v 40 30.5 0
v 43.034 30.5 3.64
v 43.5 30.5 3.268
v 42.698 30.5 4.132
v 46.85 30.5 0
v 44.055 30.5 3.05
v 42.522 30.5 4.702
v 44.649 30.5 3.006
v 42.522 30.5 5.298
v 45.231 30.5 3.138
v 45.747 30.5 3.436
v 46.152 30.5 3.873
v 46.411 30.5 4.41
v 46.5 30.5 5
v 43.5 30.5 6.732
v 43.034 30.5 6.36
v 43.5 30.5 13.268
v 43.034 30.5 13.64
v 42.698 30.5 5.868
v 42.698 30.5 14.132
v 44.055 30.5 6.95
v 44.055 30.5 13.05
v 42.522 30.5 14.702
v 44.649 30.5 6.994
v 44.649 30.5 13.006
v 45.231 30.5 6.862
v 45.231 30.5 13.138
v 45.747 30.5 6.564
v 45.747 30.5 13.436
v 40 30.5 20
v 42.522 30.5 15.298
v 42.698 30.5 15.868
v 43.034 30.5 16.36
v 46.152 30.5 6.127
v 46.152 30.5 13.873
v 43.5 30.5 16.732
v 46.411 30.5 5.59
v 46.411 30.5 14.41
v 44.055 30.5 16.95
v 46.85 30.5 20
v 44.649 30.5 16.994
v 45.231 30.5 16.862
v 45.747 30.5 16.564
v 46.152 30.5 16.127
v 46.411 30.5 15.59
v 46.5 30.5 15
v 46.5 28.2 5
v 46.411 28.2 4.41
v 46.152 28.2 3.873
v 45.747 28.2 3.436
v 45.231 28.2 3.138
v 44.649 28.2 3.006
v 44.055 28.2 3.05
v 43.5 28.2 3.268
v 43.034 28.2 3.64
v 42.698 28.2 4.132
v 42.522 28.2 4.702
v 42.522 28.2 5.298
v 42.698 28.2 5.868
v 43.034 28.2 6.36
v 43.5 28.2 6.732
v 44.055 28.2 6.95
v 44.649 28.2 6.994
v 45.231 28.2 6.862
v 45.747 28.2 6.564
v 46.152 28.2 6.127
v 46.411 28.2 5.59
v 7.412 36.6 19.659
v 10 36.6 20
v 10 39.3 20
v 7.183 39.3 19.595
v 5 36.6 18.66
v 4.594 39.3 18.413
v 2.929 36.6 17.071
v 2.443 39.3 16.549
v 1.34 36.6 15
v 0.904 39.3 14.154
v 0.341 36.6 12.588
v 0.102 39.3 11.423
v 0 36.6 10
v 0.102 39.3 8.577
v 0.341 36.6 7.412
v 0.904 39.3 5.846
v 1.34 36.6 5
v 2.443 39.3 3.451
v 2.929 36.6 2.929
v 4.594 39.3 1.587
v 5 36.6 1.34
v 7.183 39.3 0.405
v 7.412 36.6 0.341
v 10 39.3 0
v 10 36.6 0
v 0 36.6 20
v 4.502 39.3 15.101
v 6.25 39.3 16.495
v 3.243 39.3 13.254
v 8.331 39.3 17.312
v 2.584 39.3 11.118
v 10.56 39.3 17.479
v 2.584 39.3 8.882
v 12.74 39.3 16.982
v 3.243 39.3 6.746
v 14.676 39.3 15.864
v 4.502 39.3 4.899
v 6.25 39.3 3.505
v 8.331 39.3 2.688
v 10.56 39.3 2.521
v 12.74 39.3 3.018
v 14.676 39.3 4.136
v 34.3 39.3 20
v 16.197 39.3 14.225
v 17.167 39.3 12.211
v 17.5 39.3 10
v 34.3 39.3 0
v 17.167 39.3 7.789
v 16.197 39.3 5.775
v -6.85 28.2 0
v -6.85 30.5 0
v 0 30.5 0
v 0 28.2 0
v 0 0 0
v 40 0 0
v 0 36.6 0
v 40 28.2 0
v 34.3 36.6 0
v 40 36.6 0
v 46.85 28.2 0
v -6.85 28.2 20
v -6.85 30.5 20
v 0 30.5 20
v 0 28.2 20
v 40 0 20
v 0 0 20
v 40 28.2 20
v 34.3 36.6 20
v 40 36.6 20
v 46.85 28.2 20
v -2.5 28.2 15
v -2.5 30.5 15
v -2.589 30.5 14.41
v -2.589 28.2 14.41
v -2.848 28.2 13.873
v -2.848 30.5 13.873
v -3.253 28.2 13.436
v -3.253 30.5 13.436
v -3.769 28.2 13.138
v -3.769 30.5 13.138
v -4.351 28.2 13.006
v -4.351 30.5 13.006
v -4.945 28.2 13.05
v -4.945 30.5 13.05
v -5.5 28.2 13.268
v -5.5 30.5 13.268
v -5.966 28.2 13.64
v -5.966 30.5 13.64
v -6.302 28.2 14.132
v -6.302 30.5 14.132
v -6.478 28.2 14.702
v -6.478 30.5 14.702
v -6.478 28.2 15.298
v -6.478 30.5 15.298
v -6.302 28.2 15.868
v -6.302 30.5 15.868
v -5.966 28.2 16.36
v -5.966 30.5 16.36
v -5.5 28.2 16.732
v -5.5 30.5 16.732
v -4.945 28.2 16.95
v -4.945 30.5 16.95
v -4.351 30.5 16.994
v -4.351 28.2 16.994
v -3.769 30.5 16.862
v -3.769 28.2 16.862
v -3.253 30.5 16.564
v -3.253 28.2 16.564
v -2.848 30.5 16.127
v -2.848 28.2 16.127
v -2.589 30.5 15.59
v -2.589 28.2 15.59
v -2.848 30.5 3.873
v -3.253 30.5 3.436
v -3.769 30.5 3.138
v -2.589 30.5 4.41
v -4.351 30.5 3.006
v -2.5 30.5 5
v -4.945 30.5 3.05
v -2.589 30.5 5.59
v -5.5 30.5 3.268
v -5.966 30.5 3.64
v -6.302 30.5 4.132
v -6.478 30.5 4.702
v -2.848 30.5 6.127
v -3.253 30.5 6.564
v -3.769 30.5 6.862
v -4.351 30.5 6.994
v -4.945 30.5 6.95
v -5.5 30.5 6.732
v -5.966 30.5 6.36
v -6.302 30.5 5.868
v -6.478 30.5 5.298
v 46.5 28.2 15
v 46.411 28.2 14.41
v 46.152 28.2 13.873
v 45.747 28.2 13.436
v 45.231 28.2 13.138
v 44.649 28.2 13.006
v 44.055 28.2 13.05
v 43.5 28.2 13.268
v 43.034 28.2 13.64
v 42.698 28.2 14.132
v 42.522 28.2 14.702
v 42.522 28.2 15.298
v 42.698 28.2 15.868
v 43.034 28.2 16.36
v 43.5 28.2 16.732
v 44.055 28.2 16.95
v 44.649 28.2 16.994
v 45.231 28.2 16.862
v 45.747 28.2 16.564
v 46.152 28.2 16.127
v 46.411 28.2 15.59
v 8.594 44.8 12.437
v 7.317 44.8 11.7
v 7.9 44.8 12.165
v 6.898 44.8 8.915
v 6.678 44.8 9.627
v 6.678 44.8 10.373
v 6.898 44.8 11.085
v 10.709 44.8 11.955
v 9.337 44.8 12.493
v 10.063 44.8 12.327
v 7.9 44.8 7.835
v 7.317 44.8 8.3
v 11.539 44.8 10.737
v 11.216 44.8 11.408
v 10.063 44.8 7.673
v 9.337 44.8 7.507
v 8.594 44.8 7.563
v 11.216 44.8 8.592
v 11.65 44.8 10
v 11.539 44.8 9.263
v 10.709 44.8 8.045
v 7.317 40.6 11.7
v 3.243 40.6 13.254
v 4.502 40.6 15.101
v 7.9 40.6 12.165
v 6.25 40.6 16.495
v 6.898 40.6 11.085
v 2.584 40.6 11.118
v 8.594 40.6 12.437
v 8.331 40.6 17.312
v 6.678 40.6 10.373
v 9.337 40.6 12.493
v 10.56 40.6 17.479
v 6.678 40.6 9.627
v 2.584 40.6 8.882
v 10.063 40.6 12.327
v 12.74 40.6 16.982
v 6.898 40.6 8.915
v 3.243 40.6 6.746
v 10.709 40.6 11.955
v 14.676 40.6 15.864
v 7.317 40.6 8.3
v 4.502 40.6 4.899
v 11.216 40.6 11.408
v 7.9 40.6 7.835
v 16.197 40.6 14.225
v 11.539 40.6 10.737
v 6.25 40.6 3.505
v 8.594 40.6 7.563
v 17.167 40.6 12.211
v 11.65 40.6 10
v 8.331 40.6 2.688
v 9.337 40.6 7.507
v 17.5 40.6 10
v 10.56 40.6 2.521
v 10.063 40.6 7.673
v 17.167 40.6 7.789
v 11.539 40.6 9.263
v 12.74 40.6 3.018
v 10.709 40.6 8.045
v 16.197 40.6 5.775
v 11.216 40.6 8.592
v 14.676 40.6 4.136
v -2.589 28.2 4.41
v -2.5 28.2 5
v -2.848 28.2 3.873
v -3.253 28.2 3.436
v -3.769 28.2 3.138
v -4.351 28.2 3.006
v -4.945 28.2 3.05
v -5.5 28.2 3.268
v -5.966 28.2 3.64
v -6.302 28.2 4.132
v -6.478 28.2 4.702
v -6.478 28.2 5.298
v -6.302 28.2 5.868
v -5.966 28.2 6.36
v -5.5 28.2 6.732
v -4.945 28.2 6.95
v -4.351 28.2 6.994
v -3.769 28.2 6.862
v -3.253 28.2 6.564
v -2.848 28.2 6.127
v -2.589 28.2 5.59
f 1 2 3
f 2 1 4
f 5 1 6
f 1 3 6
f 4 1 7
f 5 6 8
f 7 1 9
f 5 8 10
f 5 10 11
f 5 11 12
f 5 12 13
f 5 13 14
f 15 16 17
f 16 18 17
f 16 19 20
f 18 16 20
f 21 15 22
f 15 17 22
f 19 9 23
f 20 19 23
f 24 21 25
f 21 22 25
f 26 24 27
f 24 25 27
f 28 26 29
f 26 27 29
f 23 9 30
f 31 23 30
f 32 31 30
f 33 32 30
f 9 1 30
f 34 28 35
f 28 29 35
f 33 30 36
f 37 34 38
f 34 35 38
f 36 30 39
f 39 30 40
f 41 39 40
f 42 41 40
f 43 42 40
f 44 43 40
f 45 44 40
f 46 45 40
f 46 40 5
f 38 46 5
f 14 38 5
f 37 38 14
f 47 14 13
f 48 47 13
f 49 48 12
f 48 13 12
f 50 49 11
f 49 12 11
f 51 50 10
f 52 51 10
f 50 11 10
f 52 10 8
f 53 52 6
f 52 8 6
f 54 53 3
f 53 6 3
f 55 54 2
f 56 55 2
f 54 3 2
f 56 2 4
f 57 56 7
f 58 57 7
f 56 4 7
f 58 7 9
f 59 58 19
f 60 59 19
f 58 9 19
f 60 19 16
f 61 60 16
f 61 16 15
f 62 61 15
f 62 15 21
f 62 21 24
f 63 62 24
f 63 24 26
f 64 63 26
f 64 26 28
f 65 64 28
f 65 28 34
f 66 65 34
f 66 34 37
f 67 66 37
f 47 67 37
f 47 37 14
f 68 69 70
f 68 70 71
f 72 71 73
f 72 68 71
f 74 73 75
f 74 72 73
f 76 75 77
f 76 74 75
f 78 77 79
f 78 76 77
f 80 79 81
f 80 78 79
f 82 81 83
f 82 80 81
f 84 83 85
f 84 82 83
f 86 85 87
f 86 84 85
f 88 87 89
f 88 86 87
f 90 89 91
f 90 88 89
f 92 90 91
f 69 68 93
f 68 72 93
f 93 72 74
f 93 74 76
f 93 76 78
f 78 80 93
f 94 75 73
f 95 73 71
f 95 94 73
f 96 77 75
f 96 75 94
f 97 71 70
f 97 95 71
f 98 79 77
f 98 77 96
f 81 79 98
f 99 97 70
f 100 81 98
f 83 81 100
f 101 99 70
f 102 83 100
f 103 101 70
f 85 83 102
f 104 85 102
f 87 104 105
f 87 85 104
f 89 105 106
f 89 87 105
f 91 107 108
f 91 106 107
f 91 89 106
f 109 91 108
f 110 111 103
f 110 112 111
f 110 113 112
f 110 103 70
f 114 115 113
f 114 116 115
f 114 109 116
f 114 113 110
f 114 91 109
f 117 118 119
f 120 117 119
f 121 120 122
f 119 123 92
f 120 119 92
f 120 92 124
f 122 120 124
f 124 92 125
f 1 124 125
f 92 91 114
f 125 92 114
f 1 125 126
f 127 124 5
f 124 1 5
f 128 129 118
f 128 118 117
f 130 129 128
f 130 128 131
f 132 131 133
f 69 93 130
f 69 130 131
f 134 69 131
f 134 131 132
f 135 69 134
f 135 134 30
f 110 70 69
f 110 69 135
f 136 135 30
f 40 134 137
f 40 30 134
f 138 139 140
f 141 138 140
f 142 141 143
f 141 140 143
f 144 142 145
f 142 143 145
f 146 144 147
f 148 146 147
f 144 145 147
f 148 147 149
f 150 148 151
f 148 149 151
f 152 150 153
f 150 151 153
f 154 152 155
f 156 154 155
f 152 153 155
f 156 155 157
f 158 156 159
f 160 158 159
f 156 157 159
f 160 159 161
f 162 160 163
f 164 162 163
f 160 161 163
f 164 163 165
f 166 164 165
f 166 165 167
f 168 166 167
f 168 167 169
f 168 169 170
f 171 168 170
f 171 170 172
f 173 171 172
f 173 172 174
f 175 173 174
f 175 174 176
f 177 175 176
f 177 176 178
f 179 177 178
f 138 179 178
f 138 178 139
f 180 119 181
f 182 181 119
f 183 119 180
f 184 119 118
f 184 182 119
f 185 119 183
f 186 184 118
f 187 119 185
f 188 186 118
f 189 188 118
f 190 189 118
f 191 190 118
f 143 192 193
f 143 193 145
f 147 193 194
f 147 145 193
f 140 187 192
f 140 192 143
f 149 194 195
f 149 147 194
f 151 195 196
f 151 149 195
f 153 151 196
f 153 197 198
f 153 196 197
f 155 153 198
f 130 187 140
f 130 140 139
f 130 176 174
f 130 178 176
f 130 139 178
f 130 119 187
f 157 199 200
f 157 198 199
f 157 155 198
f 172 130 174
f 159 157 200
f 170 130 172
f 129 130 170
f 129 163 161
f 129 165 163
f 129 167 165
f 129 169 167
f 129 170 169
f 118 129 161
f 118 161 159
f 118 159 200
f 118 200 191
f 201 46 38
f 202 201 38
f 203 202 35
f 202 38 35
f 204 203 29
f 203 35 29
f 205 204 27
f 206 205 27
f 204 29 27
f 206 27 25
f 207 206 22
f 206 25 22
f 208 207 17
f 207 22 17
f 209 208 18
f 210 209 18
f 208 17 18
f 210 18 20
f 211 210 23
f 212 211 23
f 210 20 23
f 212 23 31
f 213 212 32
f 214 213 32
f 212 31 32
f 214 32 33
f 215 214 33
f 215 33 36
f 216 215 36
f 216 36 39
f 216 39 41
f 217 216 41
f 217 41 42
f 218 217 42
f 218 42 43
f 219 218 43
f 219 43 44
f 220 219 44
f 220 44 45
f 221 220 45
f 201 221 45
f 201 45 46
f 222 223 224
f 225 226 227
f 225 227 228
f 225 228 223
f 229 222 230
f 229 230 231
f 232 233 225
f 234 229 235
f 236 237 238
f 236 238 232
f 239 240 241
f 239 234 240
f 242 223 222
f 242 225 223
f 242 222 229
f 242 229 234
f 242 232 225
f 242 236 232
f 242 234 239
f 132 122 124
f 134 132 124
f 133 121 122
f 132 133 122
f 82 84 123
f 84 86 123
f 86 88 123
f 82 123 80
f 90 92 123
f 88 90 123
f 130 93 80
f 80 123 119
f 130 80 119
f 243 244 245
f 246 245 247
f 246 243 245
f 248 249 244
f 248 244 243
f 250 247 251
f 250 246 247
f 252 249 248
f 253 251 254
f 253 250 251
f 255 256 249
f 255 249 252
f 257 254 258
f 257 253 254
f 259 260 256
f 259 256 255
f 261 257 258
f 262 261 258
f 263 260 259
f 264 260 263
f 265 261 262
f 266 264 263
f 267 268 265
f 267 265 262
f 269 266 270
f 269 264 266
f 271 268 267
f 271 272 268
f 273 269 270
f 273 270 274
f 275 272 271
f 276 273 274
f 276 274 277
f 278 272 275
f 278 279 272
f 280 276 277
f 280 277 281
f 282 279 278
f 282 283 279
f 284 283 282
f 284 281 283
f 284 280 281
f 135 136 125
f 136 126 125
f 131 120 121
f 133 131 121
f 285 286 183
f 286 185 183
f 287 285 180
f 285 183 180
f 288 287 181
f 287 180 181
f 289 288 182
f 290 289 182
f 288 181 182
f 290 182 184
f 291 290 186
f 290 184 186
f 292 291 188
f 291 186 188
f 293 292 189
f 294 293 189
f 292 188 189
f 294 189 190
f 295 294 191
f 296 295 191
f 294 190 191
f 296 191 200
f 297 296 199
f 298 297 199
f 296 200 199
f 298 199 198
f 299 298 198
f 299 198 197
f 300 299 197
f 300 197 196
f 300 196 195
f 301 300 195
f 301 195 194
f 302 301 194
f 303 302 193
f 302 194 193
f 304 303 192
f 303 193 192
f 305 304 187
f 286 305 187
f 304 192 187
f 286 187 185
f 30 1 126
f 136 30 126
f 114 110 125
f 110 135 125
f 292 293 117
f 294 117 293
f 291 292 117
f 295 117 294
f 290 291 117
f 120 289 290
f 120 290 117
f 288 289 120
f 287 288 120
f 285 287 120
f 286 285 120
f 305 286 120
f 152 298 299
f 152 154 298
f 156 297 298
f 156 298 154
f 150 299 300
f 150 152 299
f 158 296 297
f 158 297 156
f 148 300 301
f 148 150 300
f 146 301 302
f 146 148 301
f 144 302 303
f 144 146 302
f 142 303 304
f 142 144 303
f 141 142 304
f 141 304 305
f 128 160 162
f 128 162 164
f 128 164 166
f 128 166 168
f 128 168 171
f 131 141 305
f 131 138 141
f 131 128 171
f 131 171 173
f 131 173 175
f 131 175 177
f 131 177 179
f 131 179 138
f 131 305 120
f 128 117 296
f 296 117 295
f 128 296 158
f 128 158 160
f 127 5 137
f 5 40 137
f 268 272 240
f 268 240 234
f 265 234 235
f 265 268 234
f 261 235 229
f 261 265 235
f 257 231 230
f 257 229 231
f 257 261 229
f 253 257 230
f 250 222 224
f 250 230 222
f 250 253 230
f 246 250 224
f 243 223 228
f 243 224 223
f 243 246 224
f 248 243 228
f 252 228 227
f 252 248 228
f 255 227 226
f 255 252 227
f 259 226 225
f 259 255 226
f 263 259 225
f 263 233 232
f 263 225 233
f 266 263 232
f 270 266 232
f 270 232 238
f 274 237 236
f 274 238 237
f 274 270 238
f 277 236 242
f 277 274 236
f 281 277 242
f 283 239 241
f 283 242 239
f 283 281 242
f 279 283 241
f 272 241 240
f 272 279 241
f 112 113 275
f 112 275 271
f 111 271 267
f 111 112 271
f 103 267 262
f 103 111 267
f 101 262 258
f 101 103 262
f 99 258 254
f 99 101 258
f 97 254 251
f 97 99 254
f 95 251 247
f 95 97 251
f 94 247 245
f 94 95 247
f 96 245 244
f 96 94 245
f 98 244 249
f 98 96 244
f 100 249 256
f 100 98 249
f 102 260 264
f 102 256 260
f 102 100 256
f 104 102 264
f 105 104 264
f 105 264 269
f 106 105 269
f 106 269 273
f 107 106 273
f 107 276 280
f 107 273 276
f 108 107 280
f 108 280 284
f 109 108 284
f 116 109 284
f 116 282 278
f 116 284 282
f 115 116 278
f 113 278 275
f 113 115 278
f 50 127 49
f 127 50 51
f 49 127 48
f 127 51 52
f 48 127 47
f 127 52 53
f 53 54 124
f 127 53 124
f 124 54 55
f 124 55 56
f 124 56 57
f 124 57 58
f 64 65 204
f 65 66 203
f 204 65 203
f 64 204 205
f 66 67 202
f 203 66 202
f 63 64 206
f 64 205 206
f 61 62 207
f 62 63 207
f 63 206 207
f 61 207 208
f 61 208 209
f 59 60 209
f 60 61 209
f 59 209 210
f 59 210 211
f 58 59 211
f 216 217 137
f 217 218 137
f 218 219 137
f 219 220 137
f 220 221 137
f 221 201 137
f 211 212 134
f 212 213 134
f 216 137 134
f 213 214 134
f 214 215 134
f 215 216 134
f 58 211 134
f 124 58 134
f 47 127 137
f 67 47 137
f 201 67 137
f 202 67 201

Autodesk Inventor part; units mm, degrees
ref_plane "YZ Plane" through (0, 0, 0) normal (1, 0, 0) x (0, 1, 0)
ref_plane "XZ Plane" through (0, 0, 0) normal (0, 1, 0) x (-1, 0, 0)
ref_plane "XY Plane" through (0, 0, 0) normal (0, 0, 1) x (1, 0, 0)
sketch "스케치1" plane through (0, 0, 0) normal (0, 0, 1) x (1, 0, 0)
  line L0 (0, 0) -> (40, 0)
  line L1 (40, 0) -> (40, 36.6)
  line L2 (40, 36.6) -> (0, 36.6)
  line L3 (0, 36.6) -> (0, 0)
  dimension "d0" = 40
  dimension "d1" = 36.6
extrude "돌출1" add sketch "스케치1" along normal blind 20
sketch "스케치2" plane through (0, 0, 20) normal (0, 0, 1) x (1, 0, 0)
  line L0 (40, 0) -> (40, 36.6) projected
  line L1 (40, 30.5) -> (46.85, 30.5)
  line L2 (46.85, 30.5) -> (46.85, 28.2)
  line L3 (46.85, 28.2) -> (40, 28.2)
  line L4 (40, 28.2) -> (40, 30.5)
  line L5 (0, 30.5) -> (-6.85, 30.5)
  line L6 (-6.85, 30.5) -> (-6.85, 28.2)
  line L7 (-6.85, 28.2) -> (0, 28.2)
  line L8 (0, 28.2) -> (0, 30.5)
  line L9 (0, 0) -> (40, 0) projected
  line L10 (0, 36.6) -> (0, 0) projected
  point P0 (40, 28.2)
  point P1 (0, 29.35)
  dimension "d4" = 6.85
  dimension "d5" = 6.85
  dimension "d6" = 2.3
  dimension "d7" = 2.3
  dimension "d8" = 30.5
  dimension "d9" = 30.5
extrude "돌출2" add sketch "스케치2" against normal blind 20
sketch "스케치3" plane through (0, 36.6, 0) normal (0, 1, 0) x (1, 0, 0)
  line L0 (40, 0) -> (0, 0) projected
  line L1 (0, 0) -> (0, -20) projected
  line L2 (40, -20) -> (0, -20) projected
  line L3 (40, 0) -> (40, -20) projected
  circle A0 centre (10, -10) radius 10
  line L4 (0, 0) -> (0, -20) projected
  line L5 (0, -20) -> (34.3, -20)
  line L6 (34.3, -20) -> (34.3, 0)
  line L7 (34.3, 0) -> (0, 0)
  line L8 (0, 0) -> (0, -20)
  line L9 (40, -20) -> (0, -20) projected
  point P0 (10, -20)
  point P1 (10, 0)
  dimension "d12" = 34.3
extrude "돌출3" add sketch "스케치3" along normal blind 2.7 contours L6 L2 A0 L0 | A0
sketch "스케치4" plane through (0, 39.3, 0) normal (0, 1, 0) x (1, 0, 0)
  circle A0 centre (9.15, -10) radius 2.5
  arc A1 (10, 0) -> (10, -20) centre (10, -10) ccw projected
  line L0 (-6.85, -20) -> (-6.85, 0) projected
  point P0 (0, 0)
  point P1 (0, -10)
  point P2 (11.638, -9.755)
  point P3 (0, -10)
  point P4 (0, -10)
  dimension "d15" = 5
  dimension "d23" = 16
extrude "돌출4" add sketch "스케치4" along normal blind 5.5
sketch "스케치5" plane through (0, 39.3, 0) normal (0, 1, 0) x (1, 0, 0)
  circle A0 centre (9.15, -10) radius 2.5 projected
  line L0 (10, -20) -> (34.3, -20) projected
  line L1 (34.3, -20) -> (34.3, 0) projected
  line L2 (34.3, 0) -> (10, 0) projected
  arc A1 (10, 0) -> (10, -20) centre (10, -10) ccw projected
  circle A2 centre (10, -10) radius 7.5
  point P0 (0, 0)
  dimension "d20" = 15
sketch "스케치6" plane through (0, 0, 20) normal (0, 0, 1) x (1, 0, 0)
  point P0 (0, 0)
extrude "돌출5" add sketch "스케치5" along normal blind 1.3 contours A2
sketch "스케치18" plane through (0, 39.3, 0) normal (0, 1, 0) x (1, 0, 0)
  point P0 (0, 0)
sketch "스케치19" plane through (40, 30.5, 20) normal (0, 1, 0) x (1, 0, 0)
  circle A0 centre (4.5, 15) radius 2
  circle A1 centre (4.5, 5) radius 2
  line L0 (6.85, 0) -> (0, 0) projected
  line L1 (6.85, 0) -> (6.85, 20) projected
  line L2 (0, 20) -> (6.85, 20) projected
  line L3 (0, 0) -> (0, 20) projected
  circle A2 centre (-30, 10) radius 7.5 projected
  line L4 (-30, 0) -> (-5.7, 0) projected
  line L5 (-5.7, 0) -> (-5.7, 20) projected
  line L6 (-5.7, 20) -> (-30, 20) projected
  arc A3 (-30, 20) -> (-30, 0) centre (-30, 10) ccw projected
  line L7 (-17.85, 0) -> (-17.85, 20)
  circle A4 centre (-44.5, 15) radius 2
  line L8 (-46.85, 0) -> (-46.85, 20) projected
  circle A5 centre (-44.5, 5) radius 2
  line L9 (-46.85, 20) -> (-40, 20) projected
  dimension "d24" = 4
  dimension "d25" = 4
  dimension "d26" = 10
  dimension "d27" = 5
  dimension "d29" = 2.35
  dimension "d30" = 4
  dimension "d31" = 2.35
  dimension "d32" = 2.35
  dimension "d33" = 4
  dimension "d34" = 2.35
  dimension "d35" = 10
  dimension "d36" = 5
extrude "돌출6" cut sketch "스케치19" against normal through all contours A0 | A1 | A4 | A5
sketch "스케치35" plane through (0, 0, 0) normal (0, -1, 0) x (1, 0, 0)
  circle A0 centre (9.15, 10) radius 2.5 projected
  circle A1 centre (9.15, 10) radius 10.5
  point P0 (0, 0)
  dimension "d39" = 21
sketch "스케치36" plane through (0, 0, 20) normal (0, 0, 1) x (1, 0, 0)
  line L0 (40, 0) -> (40, 28.2) projected
  line L1 (40, 28.2) -> (46.85, 28.2) projected
  line L2 (46.85, 28.2) -> (46.85, 30.5) projected
  line L3 (46.85, 30.5) -> (40, 30.5) projected
  line L4 (40, 30.5) -> (40, 36.6) projected
  line L5 (40, 36.6) -> (34.3, 36.6) projected
  line L6 (34.3, 36.6) -> (34.3, 39.3) projected
  line L7 (10, 39.3) -> (34.3, 39.3) projected
  line L8 (10, 36.6) -> (10, 39.3) projected
  line L9 (10, 36.6) -> (0, 36.6) projected
  line L10 (0, 36.6) -> (0, 30.5) projected
  line L11 (0, 30.5) -> (-6.85, 30.5) projected
  line L12 (-6.85, 30.5) -> (-6.85, 28.2) projected
  line L13 (-6.85, 28.2) -> (0, 28.2) projected
  line L14 (0, 28.2) -> (0, 0) projected
  line L15 (0, 0) -> (40, 0) projected
properties part number "996R모터_3D 인쇄"
